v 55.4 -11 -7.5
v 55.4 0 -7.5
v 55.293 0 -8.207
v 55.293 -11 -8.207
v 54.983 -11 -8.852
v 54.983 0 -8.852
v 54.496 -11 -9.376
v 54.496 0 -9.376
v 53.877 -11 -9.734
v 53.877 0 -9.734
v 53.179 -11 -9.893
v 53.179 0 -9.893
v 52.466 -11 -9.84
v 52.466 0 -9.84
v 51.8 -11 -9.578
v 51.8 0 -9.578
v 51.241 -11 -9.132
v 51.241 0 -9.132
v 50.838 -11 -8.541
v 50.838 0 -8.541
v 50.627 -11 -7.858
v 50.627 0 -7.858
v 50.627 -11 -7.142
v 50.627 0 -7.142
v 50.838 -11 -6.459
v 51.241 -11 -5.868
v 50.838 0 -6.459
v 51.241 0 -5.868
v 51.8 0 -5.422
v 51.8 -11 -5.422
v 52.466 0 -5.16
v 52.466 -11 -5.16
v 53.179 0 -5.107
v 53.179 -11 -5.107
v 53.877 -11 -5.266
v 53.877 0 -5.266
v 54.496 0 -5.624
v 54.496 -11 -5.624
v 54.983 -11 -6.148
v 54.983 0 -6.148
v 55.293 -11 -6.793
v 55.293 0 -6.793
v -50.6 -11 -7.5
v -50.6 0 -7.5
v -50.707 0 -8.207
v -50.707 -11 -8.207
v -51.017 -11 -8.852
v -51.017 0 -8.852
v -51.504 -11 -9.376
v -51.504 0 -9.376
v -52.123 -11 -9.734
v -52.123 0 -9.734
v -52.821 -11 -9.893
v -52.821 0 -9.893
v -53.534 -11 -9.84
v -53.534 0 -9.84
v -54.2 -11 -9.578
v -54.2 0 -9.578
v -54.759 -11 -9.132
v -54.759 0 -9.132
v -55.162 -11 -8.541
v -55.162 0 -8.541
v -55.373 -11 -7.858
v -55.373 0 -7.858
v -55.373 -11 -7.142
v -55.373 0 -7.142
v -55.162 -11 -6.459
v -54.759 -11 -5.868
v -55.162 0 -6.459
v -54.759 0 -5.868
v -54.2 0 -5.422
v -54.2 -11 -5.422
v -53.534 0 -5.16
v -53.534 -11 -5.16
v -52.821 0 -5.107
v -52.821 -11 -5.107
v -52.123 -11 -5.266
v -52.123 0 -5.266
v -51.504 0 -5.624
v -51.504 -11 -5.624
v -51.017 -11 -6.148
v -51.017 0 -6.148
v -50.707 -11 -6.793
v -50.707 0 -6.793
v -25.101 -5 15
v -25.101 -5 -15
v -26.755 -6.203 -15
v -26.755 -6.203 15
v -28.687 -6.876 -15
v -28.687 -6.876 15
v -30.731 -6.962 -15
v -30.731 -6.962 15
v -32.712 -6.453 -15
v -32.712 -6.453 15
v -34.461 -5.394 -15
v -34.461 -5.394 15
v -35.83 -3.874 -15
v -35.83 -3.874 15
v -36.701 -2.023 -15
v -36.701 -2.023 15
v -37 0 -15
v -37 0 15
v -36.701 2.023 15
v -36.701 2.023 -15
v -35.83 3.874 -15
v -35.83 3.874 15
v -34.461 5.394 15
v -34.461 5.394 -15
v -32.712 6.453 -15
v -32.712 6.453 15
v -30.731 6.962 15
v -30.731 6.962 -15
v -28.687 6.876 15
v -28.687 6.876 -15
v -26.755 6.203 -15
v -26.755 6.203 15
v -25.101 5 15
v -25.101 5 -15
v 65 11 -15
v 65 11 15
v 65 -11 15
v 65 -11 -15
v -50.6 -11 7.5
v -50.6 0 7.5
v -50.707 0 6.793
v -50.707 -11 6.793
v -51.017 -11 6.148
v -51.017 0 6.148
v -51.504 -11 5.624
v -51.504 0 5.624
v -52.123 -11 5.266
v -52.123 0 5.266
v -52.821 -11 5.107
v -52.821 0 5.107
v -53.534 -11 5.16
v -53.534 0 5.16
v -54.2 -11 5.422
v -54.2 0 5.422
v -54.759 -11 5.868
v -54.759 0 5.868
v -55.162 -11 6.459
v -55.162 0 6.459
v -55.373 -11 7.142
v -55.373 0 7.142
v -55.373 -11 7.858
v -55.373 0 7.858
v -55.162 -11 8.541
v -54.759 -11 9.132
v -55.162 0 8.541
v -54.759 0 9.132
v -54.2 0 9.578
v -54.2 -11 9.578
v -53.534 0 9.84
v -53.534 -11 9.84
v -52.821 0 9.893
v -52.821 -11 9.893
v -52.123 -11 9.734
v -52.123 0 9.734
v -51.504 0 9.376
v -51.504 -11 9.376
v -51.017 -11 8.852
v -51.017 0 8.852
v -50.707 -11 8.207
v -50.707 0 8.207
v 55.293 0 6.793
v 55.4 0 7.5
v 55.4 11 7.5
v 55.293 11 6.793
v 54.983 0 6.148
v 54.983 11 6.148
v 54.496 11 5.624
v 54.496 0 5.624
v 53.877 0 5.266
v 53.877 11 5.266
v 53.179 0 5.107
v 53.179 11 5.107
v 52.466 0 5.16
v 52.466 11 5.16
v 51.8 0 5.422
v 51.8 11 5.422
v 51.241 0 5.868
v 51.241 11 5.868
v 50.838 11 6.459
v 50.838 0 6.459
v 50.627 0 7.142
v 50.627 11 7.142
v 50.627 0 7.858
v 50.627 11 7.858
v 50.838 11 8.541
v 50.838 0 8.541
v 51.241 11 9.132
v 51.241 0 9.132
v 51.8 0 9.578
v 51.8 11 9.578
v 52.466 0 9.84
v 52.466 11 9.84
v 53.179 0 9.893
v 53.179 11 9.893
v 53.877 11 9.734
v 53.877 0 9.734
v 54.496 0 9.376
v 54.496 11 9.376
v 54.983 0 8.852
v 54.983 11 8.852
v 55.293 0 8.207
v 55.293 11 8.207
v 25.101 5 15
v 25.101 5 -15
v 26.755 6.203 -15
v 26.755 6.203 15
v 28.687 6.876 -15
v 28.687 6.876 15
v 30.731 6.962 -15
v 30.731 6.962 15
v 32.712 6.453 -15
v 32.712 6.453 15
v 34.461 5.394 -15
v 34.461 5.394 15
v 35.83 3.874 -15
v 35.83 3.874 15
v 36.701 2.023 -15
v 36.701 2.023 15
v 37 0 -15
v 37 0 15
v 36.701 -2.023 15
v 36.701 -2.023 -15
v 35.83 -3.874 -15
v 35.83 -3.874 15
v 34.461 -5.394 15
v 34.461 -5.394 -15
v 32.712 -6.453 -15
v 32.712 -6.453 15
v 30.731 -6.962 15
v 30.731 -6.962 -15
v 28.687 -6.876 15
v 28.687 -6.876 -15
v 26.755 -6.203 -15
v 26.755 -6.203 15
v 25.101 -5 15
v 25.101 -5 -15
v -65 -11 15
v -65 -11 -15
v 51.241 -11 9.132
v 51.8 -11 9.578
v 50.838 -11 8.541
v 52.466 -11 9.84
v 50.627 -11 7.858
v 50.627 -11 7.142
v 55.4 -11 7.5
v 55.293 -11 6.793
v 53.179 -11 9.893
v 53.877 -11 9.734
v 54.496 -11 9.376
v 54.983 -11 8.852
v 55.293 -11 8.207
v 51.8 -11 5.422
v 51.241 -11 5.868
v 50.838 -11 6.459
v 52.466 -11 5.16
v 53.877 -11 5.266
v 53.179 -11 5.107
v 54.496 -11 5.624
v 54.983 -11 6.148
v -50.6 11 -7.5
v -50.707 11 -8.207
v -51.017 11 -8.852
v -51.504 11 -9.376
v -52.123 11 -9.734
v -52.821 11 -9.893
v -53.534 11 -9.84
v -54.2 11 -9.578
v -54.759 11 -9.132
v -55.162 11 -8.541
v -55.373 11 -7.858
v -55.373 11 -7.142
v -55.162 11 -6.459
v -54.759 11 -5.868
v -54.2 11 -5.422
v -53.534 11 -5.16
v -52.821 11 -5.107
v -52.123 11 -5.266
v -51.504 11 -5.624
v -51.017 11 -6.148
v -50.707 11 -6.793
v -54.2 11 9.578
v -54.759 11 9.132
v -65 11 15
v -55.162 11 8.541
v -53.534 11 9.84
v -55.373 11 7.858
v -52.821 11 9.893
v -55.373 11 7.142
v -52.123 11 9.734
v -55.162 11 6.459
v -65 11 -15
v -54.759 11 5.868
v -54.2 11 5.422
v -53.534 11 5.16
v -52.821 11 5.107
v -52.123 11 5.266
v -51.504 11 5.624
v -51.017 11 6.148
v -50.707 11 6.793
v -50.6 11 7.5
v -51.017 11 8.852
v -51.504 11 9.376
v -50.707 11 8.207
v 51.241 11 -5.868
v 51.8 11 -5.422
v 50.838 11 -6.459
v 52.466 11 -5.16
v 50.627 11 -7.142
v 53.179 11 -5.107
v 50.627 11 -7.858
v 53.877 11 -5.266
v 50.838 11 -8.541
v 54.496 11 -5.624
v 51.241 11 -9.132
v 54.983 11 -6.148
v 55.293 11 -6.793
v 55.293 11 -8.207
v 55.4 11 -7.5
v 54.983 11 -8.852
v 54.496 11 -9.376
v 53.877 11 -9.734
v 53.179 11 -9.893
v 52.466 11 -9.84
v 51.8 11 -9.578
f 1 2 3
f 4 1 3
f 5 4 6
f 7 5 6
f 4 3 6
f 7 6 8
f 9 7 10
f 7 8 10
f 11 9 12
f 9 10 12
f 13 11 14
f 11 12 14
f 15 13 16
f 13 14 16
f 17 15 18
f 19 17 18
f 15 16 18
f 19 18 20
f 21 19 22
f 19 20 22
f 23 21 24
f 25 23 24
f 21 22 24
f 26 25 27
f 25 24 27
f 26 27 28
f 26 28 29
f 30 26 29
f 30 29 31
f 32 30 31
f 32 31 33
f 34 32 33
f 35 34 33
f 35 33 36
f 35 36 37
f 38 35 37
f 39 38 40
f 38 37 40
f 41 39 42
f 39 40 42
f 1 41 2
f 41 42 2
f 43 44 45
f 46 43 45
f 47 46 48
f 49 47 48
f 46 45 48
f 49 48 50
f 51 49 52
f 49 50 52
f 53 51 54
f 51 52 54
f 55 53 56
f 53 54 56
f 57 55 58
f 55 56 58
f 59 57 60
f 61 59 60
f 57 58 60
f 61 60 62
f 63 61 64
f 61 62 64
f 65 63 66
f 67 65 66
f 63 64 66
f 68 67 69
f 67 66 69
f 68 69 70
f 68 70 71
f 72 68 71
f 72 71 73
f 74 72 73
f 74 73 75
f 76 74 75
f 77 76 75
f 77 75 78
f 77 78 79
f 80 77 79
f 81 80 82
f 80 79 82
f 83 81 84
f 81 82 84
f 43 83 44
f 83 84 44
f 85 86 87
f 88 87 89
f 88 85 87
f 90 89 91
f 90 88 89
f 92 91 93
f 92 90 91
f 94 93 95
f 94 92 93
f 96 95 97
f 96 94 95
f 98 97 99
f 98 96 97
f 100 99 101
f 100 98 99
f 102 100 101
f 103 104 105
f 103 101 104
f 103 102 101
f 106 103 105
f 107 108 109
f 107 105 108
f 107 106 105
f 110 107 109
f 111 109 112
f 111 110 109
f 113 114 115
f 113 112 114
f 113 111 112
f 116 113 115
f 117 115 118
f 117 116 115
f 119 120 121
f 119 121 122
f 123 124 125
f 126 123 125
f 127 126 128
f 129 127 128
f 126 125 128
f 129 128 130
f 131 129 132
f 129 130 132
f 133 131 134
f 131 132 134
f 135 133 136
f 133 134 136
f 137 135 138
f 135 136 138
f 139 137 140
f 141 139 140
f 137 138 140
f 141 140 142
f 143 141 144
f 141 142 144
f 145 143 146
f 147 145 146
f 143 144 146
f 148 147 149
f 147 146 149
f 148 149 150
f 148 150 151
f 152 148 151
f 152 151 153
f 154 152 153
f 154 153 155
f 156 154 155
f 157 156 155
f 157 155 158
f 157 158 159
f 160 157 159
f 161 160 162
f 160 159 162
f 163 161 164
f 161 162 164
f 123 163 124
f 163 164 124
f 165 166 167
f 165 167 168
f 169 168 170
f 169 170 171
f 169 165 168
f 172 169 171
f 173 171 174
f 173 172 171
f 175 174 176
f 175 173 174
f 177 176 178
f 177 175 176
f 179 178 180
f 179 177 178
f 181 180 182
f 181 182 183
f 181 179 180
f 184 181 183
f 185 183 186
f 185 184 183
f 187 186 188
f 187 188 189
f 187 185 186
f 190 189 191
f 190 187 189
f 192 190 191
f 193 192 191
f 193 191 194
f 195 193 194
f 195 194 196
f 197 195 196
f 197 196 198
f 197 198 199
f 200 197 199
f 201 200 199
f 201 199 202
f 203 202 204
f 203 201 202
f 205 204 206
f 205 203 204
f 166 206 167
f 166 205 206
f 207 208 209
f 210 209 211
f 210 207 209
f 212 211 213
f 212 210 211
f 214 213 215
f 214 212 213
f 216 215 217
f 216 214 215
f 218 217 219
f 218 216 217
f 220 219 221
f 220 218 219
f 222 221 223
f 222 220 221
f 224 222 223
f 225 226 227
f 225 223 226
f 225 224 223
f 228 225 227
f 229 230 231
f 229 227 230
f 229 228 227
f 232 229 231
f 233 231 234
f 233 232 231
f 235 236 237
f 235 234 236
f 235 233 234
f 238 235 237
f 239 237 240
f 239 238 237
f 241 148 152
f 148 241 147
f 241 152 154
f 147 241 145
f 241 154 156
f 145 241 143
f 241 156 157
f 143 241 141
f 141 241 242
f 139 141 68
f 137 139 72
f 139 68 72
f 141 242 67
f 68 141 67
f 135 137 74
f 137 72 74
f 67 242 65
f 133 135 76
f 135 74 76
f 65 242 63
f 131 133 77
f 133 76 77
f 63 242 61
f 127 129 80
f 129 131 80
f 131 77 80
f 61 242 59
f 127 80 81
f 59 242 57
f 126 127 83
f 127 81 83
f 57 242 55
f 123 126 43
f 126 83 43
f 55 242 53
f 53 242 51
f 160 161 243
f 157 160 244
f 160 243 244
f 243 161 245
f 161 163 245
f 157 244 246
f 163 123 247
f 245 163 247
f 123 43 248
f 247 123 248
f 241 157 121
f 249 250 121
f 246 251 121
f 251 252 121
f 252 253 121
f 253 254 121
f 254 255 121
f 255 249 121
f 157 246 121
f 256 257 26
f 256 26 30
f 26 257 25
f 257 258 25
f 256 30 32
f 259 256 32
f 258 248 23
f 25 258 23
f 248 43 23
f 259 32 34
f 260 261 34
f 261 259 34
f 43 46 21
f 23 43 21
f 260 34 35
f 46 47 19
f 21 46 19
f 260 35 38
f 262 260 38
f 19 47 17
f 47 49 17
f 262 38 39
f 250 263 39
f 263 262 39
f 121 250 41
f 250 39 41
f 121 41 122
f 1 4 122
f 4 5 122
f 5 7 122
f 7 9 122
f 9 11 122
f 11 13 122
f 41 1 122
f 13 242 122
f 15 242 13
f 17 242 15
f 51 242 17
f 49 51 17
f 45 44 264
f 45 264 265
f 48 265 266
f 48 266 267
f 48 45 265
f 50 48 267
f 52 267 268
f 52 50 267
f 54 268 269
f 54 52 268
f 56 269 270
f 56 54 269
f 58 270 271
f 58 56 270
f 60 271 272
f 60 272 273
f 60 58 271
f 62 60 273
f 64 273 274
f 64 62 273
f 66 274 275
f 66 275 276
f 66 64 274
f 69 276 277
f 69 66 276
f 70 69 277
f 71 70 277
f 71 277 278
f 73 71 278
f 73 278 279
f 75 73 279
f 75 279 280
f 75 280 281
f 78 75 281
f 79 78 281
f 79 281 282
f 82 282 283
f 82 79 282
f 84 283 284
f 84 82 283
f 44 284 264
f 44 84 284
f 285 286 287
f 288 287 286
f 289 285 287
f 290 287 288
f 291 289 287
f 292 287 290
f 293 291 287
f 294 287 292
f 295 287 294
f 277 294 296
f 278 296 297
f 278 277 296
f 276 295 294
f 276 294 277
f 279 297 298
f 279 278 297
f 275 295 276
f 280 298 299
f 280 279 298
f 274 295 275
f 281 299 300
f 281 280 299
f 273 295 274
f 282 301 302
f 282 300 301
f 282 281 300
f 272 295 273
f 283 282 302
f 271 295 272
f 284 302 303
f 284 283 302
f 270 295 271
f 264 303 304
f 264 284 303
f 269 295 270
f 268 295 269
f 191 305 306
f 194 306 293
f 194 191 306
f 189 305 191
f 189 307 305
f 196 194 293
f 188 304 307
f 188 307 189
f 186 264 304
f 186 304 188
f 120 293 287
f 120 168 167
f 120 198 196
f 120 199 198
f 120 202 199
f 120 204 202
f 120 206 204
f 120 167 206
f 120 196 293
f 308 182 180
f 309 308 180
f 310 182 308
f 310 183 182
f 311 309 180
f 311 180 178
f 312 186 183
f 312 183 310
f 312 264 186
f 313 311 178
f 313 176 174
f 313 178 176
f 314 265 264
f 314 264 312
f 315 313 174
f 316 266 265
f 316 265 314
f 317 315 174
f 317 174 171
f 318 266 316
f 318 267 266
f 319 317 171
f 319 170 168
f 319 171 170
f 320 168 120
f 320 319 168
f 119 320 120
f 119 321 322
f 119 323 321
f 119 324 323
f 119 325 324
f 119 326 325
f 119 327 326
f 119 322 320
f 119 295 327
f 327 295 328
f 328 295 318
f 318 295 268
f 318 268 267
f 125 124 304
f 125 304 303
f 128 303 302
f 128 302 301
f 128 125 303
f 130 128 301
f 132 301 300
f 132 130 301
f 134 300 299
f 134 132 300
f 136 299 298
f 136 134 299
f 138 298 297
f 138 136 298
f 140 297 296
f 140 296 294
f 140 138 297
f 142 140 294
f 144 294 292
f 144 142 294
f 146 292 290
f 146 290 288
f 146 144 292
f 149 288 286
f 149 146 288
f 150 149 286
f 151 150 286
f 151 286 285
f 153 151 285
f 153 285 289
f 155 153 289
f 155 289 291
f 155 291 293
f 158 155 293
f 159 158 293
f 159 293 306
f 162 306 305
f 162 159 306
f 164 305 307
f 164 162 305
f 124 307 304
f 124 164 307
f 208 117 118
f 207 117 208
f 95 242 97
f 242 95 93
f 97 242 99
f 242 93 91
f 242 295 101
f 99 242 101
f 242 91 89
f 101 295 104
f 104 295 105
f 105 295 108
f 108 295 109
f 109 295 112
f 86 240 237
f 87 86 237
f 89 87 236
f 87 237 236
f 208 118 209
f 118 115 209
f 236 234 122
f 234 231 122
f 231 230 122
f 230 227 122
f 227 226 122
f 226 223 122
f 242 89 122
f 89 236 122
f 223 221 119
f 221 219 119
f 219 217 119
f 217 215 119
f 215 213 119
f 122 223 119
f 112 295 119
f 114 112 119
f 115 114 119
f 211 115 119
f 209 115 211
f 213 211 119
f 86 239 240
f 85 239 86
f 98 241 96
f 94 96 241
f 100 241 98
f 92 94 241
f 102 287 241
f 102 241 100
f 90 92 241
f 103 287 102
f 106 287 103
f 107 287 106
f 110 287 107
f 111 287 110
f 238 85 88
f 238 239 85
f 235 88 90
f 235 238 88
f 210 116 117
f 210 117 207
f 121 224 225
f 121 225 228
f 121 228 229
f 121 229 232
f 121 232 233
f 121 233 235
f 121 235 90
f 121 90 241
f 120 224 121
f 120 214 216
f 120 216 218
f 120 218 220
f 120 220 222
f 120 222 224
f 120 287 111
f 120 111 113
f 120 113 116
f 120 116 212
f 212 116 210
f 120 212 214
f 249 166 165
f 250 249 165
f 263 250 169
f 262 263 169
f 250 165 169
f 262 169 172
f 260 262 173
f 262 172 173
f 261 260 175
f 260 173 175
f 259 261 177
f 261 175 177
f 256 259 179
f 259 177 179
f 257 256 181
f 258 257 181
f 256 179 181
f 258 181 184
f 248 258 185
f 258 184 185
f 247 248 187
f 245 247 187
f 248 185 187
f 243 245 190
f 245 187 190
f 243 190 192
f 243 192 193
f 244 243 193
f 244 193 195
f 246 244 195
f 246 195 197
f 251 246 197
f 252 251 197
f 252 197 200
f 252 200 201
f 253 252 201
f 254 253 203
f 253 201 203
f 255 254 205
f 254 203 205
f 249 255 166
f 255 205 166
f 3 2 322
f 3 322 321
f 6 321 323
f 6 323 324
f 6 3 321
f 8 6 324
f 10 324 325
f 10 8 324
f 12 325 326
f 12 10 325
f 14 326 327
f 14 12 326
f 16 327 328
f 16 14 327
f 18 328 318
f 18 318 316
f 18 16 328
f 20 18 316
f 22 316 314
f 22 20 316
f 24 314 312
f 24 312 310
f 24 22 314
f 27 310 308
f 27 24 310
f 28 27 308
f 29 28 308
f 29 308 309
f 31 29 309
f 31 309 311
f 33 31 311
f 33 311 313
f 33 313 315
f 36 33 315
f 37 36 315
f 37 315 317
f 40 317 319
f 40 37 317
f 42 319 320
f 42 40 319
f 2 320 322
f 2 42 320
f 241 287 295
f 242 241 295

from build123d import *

# Parameters (mm, degrees)
AUFSATZ_LINEAR_AUSTRAGEN1_DEPTH      = 11
AUFSATZ_LINEAR_AUSTRAGEN1_DEPTH_BACK = 11
SKIZZE2_W                            = 130
SKIZZE2_H                            = 30
SKIZZE2_R                            = 2.4
SCHNITT_LINEAR_AUSTRAGEN1_REACH      = 74.429


with BuildPart() as part:
    # Skizze2 → Aufsatz-Linear austragen1 (new, two sides: drawn at the far end of the back side and taken through both)
    with BuildSketch(Plane(origin=(0, 0, 0), x_dir=(1, 0, 0), z_dir=(0, 1, 0)).offset(-AUFSATZ_LINEAR_AUSTRAGEN1_DEPTH_BACK)):
        Rectangle(SKIZZE2_W, SKIZZE2_H)
        with Locations((-53, -7.5)):
            Circle(SKIZZE2_R, mode=Mode.SUBTRACT)
        with Locations((-53, 7.5)):
            Circle(SKIZZE2_R, mode=Mode.SUBTRACT)
        with Locations((53, -7.5)):
            Circle(SKIZZE2_R, mode=Mode.SUBTRACT)
        with Locations((53, 7.5)):
            Circle(SKIZZE2_R, mode=Mode.SUBTRACT)
    extrude(amount=AUFSATZ_LINEAR_AUSTRAGEN1_DEPTH + AUFSATZ_LINEAR_AUSTRAGEN1_DEPTH_BACK)

    # Skizze5 → Schnitt-Linear austragen1 (cut, up to next)
    with BuildSketch(Plane.XY.offset(15), mode=Mode.PRIVATE) as schnitt_linear_austragen1_sk1:
        with BuildLine():
            Line((-25.101020514, 5), (25.101020514, 5))
            ThreePointArc((25.101020514, 5), (37, 0), (25.101020514, -5))
            Line((25.101020514, -5), (-25.101020514, -5))
            ThreePointArc((-25.101020514, -5), (-37, 0), (-25.101020514, 5))
        make_face()
    schnitt_linear_austragen1_tool1 = extrude(schnitt_linear_austragen1_sk1.sketch, amount=-SCHNITT_LINEAR_AUSTRAGEN1_REACH, mode=Mode.PRIVATE) & part.part
    add(schnitt_linear_austragen1_tool1.solids().sort_by_distance((0, 0, 15))[0], mode=Mode.SUBTRACT)


solid = part.part
